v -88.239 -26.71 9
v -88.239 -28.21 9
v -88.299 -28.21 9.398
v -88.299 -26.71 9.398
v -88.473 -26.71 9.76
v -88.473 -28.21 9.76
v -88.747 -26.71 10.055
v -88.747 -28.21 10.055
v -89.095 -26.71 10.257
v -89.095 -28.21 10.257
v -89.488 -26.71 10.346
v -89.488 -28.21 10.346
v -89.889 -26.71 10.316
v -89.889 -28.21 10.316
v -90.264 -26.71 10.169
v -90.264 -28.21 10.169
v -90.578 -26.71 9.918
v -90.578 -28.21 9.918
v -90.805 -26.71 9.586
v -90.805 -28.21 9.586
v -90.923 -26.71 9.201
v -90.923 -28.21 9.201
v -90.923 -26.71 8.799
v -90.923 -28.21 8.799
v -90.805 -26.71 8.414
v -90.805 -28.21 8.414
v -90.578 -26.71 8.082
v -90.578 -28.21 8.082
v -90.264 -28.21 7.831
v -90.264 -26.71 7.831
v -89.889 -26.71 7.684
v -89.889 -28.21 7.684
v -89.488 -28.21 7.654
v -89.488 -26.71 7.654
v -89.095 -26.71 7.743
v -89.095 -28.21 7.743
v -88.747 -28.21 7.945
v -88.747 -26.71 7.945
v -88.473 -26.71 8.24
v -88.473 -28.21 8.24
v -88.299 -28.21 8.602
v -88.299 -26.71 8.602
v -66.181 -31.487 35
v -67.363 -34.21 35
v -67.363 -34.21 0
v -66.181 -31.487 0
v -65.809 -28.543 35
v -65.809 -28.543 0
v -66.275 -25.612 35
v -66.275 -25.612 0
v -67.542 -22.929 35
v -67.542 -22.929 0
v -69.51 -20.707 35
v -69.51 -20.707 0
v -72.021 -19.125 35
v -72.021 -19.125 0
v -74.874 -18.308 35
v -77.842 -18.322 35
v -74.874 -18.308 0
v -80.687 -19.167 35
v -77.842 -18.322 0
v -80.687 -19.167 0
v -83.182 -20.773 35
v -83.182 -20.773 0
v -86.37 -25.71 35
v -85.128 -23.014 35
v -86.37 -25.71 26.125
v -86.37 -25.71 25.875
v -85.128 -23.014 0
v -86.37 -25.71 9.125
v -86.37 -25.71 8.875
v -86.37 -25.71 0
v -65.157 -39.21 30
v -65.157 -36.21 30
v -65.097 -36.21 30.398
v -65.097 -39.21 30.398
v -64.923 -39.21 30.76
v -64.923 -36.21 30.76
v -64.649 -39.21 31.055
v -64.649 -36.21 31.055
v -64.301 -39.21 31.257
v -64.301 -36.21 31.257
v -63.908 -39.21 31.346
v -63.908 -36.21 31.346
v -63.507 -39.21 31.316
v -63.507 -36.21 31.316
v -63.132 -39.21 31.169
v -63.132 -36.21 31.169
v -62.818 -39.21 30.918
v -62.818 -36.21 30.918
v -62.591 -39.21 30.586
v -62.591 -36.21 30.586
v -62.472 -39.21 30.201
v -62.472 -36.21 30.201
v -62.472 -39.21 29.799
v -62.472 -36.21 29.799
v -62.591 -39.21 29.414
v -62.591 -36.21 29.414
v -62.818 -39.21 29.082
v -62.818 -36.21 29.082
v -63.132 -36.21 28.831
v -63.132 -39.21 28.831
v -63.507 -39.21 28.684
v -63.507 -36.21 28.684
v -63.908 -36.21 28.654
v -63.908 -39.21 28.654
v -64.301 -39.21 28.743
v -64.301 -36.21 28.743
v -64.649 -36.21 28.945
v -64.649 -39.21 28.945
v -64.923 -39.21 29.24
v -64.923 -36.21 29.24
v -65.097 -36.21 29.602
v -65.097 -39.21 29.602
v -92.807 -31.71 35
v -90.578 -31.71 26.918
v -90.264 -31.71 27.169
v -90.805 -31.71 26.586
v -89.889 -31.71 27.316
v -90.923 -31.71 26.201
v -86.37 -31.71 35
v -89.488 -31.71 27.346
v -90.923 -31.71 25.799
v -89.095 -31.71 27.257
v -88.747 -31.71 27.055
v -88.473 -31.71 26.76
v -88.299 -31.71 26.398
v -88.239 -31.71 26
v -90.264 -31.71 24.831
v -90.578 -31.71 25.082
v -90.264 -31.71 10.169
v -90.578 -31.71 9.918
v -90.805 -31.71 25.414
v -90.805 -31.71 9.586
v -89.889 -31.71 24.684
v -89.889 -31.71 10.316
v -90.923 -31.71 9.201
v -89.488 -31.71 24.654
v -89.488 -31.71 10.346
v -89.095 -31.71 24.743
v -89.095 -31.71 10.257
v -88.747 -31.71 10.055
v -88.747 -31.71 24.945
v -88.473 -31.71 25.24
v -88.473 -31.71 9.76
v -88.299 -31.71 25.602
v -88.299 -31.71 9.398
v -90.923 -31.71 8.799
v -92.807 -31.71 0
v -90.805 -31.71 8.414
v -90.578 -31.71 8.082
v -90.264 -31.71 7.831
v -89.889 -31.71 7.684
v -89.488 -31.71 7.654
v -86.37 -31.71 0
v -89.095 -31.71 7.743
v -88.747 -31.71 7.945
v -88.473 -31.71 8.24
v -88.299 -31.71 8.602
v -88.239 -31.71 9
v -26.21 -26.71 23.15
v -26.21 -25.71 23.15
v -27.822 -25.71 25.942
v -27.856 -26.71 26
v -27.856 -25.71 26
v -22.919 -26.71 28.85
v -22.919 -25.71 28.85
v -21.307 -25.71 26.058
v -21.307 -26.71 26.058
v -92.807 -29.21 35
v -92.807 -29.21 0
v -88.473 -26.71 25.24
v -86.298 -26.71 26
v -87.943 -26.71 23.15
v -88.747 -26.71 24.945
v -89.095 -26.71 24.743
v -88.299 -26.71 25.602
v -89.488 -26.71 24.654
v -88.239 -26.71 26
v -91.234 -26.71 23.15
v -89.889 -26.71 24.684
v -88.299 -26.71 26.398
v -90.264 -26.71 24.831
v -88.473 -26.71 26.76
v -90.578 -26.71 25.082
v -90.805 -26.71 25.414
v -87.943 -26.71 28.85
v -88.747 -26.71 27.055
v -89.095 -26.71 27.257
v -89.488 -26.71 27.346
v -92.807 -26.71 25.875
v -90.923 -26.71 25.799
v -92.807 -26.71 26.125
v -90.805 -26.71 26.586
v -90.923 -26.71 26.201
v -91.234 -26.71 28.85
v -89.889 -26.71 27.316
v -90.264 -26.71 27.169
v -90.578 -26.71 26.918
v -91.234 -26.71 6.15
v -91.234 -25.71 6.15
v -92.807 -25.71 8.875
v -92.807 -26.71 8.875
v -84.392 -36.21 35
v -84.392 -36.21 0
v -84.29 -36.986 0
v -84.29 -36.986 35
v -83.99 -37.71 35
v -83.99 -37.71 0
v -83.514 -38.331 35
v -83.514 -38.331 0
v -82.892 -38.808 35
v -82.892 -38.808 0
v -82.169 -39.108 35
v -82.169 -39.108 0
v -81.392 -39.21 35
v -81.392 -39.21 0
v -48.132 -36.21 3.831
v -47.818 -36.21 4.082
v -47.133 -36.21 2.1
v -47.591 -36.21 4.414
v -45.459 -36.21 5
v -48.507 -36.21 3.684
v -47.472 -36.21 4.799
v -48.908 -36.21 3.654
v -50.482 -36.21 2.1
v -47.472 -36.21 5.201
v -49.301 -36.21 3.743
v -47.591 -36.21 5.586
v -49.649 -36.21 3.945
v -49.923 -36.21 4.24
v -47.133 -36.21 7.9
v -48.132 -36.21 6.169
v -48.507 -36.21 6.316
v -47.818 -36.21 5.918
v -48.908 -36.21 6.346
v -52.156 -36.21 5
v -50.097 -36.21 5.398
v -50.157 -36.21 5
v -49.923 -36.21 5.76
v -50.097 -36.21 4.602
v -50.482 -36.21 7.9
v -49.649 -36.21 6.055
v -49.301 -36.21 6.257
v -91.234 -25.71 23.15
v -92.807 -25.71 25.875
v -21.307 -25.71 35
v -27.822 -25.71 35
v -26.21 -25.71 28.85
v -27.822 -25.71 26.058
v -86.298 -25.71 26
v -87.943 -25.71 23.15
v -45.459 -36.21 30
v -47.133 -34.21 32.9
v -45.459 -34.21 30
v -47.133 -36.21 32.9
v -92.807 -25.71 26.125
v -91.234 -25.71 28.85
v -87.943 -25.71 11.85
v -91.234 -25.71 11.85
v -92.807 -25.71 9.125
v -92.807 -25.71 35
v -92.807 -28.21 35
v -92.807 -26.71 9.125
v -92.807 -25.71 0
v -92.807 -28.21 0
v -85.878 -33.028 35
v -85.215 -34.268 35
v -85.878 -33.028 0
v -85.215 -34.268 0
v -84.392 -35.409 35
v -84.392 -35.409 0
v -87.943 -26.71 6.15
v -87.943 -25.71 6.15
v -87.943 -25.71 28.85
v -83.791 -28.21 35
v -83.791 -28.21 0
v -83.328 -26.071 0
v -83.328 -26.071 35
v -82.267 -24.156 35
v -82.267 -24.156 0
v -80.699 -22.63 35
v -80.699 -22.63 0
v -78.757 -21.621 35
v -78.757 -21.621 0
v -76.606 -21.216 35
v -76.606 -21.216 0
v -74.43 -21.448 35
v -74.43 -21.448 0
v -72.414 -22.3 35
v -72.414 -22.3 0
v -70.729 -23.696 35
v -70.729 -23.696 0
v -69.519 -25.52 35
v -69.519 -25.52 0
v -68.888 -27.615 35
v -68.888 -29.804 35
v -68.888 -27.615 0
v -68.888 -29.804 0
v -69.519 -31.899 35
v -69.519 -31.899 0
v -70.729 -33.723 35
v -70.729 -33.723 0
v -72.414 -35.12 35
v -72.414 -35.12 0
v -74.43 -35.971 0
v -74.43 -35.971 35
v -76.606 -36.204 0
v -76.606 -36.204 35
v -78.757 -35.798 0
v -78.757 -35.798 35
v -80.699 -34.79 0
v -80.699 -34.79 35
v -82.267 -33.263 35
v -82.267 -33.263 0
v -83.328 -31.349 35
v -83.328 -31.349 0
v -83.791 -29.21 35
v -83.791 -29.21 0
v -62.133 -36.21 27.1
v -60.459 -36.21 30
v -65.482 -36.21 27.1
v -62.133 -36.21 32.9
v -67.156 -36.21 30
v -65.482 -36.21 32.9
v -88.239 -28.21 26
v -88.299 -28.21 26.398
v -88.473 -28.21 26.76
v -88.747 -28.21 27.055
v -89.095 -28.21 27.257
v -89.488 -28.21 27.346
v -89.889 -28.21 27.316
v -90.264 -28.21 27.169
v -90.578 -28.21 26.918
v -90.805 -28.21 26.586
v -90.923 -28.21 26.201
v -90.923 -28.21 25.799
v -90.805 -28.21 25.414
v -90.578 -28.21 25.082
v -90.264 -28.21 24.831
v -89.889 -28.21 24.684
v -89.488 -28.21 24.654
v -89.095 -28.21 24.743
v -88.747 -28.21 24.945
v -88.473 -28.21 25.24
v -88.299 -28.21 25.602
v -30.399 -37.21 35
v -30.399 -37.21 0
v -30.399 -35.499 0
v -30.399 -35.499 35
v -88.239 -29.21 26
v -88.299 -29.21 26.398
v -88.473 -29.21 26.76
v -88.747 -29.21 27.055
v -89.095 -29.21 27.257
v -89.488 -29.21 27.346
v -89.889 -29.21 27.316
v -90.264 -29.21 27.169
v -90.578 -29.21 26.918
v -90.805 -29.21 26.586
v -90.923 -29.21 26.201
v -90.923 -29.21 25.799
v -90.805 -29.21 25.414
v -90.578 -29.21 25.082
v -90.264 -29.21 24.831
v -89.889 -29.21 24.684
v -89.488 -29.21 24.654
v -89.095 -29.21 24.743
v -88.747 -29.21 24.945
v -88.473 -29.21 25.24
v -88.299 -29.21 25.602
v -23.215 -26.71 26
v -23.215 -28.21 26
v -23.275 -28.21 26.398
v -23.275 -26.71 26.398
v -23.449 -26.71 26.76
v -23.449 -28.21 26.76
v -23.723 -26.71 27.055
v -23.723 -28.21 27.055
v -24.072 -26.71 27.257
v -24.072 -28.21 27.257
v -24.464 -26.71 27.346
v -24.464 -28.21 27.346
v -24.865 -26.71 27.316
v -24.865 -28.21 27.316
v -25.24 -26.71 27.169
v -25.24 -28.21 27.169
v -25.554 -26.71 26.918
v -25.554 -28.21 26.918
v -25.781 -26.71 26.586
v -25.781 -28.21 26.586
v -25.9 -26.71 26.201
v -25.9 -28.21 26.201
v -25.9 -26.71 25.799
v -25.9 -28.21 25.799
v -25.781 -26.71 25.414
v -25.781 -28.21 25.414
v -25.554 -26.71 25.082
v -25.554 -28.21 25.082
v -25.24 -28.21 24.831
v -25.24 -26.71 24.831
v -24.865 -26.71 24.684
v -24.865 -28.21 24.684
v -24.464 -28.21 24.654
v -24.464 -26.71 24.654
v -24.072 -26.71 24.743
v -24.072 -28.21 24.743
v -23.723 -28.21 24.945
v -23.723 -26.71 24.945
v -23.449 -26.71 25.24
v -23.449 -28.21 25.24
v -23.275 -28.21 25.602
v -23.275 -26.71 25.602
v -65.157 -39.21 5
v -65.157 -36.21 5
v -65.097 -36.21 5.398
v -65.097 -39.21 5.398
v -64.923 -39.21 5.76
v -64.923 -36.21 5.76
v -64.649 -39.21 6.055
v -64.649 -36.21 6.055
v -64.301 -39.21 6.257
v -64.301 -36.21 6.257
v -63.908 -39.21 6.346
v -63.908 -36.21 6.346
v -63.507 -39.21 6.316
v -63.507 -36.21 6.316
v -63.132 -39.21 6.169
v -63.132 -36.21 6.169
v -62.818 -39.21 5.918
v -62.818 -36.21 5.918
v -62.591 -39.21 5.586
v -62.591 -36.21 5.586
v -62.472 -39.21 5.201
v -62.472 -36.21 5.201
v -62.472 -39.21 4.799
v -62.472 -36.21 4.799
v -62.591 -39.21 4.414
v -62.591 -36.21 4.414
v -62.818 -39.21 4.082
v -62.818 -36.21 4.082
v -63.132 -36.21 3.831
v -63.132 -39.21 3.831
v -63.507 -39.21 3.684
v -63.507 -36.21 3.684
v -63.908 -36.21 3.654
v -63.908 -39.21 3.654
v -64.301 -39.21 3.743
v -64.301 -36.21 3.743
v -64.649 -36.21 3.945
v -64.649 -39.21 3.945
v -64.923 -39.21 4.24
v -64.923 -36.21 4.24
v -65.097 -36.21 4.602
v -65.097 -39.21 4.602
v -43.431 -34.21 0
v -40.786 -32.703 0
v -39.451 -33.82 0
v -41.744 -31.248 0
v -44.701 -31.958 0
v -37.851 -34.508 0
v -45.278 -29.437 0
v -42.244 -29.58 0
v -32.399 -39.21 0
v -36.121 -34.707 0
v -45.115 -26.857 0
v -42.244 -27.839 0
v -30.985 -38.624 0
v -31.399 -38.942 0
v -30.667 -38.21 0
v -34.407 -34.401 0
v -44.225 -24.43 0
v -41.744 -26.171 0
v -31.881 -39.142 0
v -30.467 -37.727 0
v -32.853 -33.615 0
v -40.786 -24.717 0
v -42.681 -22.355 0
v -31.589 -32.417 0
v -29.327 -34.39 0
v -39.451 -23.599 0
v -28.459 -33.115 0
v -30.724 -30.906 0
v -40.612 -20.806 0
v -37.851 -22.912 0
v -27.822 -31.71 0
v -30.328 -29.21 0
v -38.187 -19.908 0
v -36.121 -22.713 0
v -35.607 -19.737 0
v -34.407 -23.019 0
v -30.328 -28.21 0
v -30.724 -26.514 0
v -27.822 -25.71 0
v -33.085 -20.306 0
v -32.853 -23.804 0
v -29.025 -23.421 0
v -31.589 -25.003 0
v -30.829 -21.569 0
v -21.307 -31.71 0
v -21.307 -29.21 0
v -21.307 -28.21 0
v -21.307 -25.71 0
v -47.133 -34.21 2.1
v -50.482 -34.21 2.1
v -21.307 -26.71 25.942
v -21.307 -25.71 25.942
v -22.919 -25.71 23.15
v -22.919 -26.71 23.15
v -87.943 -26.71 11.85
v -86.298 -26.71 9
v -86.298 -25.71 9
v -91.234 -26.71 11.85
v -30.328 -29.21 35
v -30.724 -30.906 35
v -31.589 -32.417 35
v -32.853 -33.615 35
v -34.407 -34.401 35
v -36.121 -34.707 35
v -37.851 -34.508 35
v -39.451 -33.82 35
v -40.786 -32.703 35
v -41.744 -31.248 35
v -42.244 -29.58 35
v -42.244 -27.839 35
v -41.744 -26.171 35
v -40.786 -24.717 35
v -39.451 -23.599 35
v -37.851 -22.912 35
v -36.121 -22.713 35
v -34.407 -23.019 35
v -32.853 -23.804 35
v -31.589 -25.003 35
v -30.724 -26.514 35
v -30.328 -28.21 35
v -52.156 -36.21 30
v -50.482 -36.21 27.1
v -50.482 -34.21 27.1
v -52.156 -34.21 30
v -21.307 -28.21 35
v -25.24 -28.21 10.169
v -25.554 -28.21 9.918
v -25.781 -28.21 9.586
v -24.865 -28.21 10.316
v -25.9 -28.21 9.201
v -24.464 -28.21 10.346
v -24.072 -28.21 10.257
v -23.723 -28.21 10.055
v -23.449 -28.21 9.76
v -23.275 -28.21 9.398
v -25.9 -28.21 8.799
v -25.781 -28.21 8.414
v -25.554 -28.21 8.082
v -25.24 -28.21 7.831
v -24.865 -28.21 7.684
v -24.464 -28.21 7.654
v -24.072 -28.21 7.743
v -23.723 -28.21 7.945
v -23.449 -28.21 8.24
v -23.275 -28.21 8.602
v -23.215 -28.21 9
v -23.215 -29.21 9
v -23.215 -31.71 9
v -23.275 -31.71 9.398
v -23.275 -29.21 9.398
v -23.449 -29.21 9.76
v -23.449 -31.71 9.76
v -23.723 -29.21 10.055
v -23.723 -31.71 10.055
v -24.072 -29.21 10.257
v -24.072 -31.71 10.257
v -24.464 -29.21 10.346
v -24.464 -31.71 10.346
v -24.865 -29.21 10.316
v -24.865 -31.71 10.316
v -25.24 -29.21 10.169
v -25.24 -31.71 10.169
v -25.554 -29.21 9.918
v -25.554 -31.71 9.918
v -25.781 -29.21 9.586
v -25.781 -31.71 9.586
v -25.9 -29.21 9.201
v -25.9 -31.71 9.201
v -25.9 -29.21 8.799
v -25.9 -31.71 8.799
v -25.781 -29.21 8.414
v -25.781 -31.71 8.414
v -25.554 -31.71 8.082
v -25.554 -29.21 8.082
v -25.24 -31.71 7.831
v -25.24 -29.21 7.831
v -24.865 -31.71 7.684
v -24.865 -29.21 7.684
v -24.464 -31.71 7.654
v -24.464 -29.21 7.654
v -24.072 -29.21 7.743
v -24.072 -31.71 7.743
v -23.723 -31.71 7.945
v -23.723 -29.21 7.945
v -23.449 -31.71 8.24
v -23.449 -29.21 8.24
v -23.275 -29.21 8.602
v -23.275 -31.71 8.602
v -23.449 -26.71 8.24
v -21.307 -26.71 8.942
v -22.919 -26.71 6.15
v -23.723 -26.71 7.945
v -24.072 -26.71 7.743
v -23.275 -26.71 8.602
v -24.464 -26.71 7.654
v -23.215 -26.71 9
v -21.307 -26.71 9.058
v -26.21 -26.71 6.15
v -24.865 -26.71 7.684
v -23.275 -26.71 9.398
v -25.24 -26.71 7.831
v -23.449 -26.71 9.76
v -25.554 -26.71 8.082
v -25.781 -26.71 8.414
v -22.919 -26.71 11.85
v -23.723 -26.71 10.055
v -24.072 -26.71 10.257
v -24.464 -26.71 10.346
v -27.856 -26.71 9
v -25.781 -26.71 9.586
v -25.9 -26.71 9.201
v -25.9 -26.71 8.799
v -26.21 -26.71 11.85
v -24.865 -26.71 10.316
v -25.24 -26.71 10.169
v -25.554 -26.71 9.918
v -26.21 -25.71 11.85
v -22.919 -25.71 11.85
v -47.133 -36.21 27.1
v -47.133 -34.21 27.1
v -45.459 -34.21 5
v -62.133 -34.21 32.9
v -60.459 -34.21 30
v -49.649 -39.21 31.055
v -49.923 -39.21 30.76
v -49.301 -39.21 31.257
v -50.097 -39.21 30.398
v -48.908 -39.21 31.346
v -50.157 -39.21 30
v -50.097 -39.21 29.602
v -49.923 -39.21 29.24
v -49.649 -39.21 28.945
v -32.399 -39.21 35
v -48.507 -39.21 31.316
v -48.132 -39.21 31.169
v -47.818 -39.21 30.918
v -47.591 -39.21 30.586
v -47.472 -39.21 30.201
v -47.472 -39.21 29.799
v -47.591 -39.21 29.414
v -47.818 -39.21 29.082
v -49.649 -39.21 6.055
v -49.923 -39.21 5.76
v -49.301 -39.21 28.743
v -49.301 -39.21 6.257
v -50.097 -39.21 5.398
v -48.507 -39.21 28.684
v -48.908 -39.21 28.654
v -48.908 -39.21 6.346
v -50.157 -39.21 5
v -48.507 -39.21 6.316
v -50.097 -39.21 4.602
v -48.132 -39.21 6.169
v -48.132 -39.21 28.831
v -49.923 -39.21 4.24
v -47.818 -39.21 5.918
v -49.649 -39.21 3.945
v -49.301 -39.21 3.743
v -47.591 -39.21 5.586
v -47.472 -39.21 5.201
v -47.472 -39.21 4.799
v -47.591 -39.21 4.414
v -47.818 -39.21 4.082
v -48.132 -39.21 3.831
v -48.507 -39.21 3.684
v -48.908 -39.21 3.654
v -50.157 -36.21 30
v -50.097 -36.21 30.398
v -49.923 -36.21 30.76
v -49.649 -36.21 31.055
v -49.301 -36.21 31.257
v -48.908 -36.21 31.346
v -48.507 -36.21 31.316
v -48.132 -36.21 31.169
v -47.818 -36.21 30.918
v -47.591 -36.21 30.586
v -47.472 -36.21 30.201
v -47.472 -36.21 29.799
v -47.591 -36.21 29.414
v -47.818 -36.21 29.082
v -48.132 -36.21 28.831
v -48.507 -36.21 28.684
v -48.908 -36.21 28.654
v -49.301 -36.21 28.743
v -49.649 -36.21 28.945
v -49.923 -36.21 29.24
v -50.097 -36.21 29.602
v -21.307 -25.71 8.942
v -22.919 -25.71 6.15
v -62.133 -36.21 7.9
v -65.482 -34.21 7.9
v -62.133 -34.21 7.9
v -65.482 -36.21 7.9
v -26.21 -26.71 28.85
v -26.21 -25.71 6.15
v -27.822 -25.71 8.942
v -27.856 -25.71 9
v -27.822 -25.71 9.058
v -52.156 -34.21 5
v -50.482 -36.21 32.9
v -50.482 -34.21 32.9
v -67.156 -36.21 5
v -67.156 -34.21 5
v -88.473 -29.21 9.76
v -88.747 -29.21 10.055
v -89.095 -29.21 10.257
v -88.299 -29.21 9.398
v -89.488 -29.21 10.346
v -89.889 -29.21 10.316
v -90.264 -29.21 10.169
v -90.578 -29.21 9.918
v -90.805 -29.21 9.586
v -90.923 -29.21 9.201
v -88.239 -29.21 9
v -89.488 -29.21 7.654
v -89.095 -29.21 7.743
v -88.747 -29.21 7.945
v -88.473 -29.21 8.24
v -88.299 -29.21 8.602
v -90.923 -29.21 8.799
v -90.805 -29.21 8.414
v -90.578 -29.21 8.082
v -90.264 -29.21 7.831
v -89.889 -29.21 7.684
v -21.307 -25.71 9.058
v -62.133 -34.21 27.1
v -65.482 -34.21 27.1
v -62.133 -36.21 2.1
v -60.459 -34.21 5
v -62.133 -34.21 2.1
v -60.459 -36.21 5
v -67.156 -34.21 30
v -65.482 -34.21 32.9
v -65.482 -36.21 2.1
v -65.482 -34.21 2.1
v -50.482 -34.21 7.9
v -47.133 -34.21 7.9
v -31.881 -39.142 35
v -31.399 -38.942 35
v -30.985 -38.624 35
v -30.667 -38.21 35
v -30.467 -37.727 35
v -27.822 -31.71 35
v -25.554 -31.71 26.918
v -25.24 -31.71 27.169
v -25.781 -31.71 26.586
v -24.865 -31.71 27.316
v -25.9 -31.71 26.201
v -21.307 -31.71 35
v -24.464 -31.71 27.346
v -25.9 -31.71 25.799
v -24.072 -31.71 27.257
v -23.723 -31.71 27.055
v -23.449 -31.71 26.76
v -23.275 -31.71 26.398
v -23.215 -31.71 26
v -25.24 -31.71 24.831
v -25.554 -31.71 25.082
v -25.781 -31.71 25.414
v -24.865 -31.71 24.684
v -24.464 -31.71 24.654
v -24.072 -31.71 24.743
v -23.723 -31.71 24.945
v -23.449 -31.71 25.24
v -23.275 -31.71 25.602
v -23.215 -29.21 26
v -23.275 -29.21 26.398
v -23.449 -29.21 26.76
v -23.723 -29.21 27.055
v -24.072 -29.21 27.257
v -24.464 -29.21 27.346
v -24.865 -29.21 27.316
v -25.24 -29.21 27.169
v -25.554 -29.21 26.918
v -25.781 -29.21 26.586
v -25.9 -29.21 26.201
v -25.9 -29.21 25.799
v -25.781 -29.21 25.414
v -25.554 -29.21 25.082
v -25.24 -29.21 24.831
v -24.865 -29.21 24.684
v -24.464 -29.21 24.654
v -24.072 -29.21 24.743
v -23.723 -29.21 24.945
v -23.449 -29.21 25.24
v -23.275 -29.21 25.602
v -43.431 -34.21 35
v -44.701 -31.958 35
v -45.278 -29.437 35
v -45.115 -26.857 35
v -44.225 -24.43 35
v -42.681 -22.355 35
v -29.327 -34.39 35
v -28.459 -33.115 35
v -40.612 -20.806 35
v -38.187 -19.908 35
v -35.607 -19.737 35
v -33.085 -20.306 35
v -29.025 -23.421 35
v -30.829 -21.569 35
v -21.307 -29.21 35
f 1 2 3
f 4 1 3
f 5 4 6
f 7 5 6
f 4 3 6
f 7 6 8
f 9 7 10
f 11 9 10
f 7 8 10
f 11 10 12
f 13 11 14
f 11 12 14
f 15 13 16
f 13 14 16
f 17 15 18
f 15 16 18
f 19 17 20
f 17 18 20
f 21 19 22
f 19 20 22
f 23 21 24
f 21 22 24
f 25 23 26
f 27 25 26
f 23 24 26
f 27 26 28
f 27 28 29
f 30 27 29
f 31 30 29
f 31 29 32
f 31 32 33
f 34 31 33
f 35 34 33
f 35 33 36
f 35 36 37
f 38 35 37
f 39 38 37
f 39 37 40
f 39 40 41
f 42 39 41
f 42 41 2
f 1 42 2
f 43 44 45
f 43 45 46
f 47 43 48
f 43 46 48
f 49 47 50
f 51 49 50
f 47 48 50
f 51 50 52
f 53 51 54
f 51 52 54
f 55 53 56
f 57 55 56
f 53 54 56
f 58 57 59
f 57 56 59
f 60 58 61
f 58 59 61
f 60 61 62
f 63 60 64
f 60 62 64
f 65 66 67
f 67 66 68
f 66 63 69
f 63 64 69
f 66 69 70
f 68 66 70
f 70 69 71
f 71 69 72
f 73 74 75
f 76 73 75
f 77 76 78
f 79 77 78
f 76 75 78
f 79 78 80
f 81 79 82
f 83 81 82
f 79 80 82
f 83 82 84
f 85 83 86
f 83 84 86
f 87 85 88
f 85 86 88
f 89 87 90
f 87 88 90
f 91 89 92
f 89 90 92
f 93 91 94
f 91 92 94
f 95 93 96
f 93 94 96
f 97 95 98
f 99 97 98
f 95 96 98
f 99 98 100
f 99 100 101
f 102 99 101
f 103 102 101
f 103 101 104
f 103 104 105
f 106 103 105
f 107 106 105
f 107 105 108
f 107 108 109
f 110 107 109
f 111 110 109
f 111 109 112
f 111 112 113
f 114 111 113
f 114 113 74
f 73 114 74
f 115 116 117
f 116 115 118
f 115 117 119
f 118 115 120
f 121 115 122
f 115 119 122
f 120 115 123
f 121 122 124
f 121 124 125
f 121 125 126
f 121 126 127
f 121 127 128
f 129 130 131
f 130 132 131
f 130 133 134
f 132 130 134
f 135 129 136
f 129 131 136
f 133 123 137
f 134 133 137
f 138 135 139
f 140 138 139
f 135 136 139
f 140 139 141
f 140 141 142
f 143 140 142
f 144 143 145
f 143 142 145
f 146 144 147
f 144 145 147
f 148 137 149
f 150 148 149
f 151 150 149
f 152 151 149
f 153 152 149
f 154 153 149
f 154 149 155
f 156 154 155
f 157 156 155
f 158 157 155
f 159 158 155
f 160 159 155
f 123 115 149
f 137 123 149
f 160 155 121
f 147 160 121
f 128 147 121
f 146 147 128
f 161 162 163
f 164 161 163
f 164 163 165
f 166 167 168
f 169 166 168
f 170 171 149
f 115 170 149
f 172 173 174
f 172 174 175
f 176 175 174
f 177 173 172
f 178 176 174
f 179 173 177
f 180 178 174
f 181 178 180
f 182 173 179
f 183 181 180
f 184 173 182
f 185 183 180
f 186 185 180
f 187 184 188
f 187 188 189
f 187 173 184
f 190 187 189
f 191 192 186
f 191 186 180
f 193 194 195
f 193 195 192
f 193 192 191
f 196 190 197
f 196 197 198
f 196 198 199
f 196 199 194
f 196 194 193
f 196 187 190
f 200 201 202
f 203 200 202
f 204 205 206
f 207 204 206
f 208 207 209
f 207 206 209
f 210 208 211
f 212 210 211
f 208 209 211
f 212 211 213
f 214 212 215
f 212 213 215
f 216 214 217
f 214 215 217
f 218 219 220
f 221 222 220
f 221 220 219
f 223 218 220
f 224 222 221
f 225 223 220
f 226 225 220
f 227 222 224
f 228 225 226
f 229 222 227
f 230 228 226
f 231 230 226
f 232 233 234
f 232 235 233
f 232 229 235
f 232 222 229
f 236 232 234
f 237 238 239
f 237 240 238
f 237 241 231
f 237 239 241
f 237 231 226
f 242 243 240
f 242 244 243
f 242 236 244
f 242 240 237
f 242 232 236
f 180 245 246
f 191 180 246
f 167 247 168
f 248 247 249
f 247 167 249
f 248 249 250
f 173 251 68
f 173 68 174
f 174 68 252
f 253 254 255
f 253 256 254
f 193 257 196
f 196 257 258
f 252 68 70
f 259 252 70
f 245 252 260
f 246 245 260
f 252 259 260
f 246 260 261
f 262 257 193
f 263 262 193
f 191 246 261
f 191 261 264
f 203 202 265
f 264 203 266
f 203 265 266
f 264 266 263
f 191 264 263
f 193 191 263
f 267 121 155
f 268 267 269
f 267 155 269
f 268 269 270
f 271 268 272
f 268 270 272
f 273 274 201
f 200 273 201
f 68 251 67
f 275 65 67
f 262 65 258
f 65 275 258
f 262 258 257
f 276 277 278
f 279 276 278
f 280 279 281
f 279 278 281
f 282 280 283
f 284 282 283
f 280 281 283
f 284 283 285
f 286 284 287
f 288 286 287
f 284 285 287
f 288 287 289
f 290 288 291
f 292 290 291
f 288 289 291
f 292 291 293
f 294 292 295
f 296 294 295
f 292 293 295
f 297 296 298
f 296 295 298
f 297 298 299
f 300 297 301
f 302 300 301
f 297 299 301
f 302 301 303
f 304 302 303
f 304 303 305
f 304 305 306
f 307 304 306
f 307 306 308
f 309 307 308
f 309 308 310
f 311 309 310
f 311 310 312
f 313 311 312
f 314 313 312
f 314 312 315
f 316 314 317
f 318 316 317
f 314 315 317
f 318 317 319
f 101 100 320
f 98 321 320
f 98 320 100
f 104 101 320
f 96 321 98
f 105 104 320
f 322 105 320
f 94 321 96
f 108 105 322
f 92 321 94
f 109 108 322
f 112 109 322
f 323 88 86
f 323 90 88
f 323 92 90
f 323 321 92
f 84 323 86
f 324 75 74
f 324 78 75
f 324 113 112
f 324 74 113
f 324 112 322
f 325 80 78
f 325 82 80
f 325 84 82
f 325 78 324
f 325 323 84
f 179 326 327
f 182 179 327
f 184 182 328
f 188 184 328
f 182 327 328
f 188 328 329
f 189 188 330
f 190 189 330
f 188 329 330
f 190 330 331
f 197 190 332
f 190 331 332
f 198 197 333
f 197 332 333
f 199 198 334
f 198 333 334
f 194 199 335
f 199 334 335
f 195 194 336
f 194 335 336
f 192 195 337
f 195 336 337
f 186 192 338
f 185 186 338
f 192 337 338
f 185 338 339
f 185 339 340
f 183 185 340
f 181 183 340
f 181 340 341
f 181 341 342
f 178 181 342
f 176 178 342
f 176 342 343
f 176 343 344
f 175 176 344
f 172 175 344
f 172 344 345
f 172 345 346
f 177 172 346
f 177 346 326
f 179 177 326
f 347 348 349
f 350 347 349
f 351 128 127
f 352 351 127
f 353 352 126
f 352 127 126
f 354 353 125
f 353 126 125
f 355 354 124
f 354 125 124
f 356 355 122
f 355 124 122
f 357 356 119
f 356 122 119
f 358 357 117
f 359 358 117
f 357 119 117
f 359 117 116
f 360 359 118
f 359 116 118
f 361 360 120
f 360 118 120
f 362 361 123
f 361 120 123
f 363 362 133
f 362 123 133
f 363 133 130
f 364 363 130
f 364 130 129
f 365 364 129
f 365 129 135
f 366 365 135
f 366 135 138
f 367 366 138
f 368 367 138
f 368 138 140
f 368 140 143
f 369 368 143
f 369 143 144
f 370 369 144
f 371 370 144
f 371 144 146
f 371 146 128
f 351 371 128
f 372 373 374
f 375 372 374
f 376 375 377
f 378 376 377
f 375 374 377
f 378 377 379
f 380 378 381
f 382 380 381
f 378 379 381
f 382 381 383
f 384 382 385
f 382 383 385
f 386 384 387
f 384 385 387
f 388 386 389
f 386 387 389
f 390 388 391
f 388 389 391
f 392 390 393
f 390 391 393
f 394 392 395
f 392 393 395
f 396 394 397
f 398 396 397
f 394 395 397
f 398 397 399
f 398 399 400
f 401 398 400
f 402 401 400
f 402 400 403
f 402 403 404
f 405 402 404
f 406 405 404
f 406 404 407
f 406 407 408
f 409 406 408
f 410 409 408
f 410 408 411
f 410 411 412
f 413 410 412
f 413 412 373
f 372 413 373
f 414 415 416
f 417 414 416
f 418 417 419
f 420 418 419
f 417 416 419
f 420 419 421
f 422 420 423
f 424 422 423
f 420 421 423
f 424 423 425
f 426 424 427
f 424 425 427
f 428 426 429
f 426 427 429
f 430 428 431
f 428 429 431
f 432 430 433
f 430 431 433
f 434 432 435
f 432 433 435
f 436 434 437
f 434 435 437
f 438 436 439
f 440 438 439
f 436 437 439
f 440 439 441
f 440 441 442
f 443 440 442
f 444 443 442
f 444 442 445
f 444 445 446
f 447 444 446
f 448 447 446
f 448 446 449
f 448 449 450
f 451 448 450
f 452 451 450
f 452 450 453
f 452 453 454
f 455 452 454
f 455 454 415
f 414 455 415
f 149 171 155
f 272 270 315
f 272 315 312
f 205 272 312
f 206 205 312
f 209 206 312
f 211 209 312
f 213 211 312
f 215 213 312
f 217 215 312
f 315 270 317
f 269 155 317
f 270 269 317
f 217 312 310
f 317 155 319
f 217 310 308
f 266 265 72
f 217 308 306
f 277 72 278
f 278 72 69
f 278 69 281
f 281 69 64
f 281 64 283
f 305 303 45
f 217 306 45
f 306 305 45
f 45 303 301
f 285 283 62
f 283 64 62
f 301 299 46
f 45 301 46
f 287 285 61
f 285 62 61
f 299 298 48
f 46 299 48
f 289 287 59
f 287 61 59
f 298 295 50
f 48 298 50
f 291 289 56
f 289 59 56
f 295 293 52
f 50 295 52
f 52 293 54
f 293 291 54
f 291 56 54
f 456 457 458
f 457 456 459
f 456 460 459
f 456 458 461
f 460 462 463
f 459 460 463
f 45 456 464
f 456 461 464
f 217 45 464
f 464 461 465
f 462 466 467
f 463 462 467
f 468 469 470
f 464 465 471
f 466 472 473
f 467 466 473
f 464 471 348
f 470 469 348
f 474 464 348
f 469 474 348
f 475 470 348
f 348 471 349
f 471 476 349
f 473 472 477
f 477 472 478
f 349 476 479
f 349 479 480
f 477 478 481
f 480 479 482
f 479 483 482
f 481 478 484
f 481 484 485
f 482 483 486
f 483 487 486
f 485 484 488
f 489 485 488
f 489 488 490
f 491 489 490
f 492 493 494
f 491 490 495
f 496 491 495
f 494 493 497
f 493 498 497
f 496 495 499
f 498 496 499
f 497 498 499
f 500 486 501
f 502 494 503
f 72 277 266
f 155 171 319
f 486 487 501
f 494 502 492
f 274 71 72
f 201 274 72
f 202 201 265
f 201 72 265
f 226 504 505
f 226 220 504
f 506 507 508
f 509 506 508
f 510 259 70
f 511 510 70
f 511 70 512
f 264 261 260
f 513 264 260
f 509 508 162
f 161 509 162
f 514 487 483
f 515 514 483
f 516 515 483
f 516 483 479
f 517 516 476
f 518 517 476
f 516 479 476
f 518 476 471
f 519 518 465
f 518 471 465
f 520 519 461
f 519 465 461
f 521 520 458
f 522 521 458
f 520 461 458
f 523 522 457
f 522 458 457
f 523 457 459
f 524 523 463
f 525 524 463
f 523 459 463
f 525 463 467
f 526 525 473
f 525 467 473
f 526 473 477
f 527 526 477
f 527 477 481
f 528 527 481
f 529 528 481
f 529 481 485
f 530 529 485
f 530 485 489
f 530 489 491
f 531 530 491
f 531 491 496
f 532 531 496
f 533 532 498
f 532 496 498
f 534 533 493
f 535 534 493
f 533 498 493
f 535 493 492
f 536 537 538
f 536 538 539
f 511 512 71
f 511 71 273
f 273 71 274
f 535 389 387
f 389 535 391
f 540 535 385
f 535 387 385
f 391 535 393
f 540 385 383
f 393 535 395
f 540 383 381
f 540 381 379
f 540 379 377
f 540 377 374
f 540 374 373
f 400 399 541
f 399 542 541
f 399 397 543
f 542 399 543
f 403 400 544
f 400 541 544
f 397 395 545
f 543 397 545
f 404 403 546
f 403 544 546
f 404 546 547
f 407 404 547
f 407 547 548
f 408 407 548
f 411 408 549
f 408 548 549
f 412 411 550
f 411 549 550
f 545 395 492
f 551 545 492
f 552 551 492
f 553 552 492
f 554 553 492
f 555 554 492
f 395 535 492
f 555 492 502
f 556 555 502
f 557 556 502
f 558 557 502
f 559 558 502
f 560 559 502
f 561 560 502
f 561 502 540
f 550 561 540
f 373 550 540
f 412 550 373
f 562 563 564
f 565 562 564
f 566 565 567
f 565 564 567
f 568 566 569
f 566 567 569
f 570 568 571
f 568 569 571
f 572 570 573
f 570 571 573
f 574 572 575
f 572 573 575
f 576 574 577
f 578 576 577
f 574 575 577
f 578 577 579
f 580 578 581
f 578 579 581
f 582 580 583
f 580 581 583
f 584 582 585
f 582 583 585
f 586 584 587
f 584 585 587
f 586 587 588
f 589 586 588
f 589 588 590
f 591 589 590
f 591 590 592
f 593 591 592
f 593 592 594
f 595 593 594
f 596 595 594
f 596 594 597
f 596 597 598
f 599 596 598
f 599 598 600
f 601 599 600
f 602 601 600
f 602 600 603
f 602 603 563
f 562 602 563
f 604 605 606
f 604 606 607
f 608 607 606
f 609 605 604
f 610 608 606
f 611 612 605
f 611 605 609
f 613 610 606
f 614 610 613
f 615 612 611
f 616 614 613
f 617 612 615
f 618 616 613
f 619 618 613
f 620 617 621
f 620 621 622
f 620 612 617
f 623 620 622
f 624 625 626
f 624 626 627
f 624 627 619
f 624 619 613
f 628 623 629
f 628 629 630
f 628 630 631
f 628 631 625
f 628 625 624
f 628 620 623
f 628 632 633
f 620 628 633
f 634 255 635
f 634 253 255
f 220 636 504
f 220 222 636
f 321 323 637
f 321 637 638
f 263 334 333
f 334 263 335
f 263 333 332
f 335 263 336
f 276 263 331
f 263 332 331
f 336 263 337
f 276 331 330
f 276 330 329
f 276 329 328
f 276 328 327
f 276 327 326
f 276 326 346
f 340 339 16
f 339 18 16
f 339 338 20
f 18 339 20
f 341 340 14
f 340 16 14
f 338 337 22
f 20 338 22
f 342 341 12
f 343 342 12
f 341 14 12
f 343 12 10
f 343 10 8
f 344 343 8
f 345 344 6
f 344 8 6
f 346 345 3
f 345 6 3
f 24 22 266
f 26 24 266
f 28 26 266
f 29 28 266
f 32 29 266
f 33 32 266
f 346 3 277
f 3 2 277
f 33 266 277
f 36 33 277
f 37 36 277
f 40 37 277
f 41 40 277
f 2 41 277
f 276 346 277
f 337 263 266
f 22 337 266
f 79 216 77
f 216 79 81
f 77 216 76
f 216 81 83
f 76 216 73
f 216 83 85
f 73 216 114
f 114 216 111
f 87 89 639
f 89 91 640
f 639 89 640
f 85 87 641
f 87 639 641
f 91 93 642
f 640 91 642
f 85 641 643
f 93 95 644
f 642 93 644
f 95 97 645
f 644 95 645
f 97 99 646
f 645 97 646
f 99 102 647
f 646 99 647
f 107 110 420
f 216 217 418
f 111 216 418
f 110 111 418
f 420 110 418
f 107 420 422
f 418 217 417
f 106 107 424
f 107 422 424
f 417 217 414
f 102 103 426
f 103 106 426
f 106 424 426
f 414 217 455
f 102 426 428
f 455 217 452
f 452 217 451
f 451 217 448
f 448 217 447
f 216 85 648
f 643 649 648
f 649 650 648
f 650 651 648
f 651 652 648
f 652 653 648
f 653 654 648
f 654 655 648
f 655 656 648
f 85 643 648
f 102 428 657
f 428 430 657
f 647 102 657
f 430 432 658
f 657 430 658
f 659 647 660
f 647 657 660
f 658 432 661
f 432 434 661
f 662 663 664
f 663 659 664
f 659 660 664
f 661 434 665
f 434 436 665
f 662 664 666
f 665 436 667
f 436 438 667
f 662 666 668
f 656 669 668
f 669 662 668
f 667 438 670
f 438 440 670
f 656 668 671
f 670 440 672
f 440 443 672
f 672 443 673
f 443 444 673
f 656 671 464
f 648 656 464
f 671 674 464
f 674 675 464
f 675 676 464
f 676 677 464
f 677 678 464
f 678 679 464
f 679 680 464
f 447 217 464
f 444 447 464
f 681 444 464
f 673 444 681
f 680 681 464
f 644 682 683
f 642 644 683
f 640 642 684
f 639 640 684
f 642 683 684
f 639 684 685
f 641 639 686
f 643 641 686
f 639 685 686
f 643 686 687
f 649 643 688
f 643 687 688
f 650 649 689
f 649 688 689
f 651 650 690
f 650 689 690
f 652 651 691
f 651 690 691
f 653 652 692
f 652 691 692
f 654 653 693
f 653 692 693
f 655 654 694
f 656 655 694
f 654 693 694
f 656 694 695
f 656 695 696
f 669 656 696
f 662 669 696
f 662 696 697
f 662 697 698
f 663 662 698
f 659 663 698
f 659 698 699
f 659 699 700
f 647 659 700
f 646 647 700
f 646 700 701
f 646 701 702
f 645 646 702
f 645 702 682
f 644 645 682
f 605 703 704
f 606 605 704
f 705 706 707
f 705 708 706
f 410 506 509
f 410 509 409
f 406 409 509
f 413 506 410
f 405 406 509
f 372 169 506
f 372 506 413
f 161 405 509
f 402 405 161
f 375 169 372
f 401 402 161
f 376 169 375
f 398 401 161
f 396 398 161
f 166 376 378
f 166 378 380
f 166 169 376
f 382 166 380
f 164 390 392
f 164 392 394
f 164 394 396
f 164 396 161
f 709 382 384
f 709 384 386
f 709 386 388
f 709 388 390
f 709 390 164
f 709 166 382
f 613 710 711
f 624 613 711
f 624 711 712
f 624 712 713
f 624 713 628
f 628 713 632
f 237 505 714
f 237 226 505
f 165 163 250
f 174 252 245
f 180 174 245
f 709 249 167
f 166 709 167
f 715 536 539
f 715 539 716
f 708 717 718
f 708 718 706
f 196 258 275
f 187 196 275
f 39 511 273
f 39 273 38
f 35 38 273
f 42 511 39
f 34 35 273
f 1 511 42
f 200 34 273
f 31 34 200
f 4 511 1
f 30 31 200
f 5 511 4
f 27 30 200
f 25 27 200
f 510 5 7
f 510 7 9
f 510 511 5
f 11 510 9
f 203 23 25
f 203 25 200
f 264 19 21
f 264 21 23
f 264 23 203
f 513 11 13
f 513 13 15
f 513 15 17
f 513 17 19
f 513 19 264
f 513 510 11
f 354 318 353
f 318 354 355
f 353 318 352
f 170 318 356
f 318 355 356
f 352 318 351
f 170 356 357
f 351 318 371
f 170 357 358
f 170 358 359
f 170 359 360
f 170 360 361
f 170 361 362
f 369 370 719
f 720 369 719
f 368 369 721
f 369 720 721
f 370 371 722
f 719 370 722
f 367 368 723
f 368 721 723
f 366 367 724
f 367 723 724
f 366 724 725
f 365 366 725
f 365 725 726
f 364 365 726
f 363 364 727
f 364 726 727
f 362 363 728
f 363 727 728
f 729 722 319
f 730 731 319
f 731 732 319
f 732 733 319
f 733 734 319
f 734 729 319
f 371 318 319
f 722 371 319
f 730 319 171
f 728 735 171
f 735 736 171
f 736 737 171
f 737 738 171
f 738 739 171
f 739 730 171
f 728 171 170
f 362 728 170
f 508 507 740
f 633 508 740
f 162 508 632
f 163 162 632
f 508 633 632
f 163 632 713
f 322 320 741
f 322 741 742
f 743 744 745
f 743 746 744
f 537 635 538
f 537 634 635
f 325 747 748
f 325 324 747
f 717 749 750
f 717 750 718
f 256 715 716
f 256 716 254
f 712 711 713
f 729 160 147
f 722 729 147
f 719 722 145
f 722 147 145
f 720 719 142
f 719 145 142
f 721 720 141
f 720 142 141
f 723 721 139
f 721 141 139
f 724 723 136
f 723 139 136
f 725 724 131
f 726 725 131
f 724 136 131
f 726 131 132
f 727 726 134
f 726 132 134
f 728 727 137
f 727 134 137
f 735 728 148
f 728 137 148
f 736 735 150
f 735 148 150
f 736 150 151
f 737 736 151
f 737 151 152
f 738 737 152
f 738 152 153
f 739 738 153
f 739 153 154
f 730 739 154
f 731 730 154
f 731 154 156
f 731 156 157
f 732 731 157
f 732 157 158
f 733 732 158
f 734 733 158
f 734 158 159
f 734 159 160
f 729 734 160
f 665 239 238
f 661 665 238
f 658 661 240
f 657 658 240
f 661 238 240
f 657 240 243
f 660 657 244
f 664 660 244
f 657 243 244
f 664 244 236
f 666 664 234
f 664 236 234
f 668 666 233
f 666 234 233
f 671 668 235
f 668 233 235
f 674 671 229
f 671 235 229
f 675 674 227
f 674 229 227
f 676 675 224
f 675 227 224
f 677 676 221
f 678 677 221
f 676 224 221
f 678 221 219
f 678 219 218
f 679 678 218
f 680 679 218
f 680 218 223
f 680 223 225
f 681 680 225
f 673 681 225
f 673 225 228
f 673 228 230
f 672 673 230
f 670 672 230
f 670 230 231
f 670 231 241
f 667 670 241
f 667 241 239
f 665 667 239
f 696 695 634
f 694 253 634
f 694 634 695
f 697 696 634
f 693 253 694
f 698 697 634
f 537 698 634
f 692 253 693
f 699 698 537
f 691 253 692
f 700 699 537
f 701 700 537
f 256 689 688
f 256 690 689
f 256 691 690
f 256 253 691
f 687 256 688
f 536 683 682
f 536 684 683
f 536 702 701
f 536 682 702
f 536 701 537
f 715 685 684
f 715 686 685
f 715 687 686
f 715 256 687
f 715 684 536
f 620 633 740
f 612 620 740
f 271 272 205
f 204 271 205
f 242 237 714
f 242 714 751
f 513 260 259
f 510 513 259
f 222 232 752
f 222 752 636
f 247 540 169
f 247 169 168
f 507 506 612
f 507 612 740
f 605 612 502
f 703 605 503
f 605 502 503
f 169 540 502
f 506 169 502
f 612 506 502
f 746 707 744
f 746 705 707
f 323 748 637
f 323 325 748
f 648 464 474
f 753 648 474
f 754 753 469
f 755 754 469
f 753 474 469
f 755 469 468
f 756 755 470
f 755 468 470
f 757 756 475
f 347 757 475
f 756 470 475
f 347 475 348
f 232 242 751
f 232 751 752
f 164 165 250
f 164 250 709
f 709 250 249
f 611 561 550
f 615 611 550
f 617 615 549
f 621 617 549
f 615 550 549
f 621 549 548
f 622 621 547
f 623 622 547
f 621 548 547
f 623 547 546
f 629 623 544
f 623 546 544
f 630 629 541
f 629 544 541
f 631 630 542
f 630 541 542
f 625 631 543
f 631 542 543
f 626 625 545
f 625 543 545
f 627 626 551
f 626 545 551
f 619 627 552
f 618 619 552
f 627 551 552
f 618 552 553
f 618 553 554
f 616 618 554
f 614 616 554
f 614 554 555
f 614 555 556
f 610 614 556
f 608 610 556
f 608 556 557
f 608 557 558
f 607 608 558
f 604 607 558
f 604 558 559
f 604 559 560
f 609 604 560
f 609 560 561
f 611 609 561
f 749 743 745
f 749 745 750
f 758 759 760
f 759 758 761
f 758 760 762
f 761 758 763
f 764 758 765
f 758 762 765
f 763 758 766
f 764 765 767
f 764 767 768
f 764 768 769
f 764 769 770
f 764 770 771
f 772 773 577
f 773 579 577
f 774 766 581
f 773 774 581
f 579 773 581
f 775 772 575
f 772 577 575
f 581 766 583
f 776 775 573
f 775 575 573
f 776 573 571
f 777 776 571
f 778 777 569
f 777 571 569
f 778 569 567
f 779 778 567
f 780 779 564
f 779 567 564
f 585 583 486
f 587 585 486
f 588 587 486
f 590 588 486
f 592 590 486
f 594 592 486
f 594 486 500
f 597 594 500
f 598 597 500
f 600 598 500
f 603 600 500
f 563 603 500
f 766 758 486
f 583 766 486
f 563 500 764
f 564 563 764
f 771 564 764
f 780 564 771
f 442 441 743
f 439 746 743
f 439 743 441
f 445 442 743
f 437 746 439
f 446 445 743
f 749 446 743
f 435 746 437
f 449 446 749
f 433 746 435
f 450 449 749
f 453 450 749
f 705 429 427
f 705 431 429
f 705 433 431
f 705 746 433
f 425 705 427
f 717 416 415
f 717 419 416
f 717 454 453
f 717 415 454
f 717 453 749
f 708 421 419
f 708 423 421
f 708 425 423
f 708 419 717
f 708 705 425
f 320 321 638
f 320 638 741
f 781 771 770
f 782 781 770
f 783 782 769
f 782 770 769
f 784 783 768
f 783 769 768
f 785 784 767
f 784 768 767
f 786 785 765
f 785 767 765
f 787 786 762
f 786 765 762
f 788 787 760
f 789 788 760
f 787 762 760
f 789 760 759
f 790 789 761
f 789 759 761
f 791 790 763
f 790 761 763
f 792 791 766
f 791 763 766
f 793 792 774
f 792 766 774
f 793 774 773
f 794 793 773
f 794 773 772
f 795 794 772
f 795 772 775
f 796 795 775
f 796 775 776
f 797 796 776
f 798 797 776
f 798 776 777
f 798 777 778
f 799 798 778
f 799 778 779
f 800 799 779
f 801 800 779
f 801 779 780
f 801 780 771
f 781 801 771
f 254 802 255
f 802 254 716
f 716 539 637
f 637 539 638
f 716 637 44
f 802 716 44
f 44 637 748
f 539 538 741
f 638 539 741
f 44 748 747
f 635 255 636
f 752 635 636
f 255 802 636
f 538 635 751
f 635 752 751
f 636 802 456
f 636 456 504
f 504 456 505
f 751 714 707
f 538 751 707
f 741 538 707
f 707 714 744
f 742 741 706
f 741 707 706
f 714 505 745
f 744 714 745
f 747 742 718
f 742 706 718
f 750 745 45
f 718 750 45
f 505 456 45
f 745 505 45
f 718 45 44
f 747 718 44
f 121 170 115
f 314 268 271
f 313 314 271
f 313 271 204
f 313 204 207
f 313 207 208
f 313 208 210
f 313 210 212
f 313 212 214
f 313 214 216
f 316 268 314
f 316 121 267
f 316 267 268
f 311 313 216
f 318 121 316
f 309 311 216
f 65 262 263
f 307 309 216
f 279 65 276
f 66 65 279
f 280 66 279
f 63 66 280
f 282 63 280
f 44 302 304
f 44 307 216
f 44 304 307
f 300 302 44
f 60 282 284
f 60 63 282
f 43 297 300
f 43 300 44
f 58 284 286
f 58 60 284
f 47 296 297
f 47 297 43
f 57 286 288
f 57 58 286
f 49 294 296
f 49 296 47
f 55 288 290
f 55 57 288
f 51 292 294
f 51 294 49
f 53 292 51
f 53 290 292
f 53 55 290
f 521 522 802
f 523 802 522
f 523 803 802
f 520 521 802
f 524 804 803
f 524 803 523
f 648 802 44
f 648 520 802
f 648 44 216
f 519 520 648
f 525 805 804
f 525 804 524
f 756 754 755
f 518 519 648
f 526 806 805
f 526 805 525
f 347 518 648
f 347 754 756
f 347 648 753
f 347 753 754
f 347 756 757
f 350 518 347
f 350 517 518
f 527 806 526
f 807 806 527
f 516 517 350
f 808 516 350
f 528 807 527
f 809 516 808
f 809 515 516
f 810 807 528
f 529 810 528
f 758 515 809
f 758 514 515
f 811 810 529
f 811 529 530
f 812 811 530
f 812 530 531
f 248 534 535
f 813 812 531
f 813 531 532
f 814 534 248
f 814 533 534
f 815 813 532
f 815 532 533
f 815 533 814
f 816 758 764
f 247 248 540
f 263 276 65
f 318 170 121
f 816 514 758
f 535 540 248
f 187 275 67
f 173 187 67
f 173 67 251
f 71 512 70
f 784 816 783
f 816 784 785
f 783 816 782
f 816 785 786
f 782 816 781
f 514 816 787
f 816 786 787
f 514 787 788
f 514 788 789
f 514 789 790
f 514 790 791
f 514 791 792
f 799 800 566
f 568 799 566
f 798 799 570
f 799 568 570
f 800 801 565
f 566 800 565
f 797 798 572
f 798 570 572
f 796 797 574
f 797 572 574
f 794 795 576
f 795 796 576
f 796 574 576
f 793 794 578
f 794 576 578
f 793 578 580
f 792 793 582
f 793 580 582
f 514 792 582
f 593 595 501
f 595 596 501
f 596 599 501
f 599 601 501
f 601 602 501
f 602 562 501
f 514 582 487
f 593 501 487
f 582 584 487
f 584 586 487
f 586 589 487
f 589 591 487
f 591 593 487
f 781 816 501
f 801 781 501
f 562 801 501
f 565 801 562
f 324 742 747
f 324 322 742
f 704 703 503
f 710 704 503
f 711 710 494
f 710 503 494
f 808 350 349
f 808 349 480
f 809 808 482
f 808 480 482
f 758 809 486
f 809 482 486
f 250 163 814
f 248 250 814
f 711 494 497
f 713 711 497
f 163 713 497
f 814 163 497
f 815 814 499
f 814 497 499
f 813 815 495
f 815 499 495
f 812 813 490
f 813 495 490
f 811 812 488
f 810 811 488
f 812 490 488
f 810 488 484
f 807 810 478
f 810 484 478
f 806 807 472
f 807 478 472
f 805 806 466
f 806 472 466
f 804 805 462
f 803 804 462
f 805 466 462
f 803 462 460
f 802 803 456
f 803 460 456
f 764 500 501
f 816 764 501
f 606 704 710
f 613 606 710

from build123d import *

# Parameters (mm, degrees)
F1_DEPTH   = 35
F3_D       = 2.7
F5_DEPTH   = 1
F6_DEPTH   = 1
F9_D       = 2.7
F9_ON_F7_D = 2.7
F8_W       = 1.6217698948
F8_H       = 2.85
F10_DEPTH  = 1
F11_DEPTH  = 1


# Not quite as in the source:
# - a feature names something its author has since deleted; it is built from what else it names


with BuildPart() as f1:
    # F0 (on Top) → F1 (new body)
    with BuildSketch(Plane.XY):
        with BuildLine():
            Line((-21.3074208284, -25.7097307226), (-27.8221394541, -25.7097307226))
            ThreePointArc((-27.8221394541, -25.7097307226), (-41.1900200037, -21.1492925546), (-42.5323706273, -35.2097307226))
            Line((-42.5323706273, -35.2097307226), (-68.0612095771, -35.2097307226))
            ThreePointArc((-68.0612095771, -35.2097307226), (-71.4714049121, -19.3897012131), (-86.3697267271, -25.7097307226))
            Line((-86.3697267271, -25.7097307226), (-92.8074208284, -25.7097307226))
            Line((-92.8074208284, -25.7097307226), (-92.8074208284, -28.2097307226))
            Line((-92.8074208284, -28.2097307226), (-83.7907356019, -28.2097307226))
            ThreePointArc((-83.7907356019, -28.2097307226), (-68.8074208284, -28.7097307226), (-83.7907356019, -29.2097307226))
            Line((-83.7907356019, -29.2097307226), (-92.8074208284, -29.2097307226))
            Line((-92.8074208284, -29.2097307226), (-92.8074208284, -31.7097307226))
            Line((-92.8074208284, -31.7097307226), (-86.3697267271, -31.7097307226))
            ThreePointArc((-86.3697267271, -31.7097307226), (-85.5676654464, -33.6592629847), (-84.3923404334, -35.4092885424))
            Line((-84.3923404334, -35.4092885424), (-84.3923404334, -36.2097307226))
            ThreePointArc((-84.3923404334, -36.2097307226), (-83.5136607769, -38.3310510662), (-81.3923404334, -39.2097307226))
            Line((-81.3923404334, -39.2097307226), (-32.3990289542, -39.2097307226))
            ThreePointArc((-32.3990289542, -39.2097307226), (-30.9848153918, -38.623944285), (-30.3990289542, -37.2097307226))
            Line((-30.3990289542, -37.2097307226), (-30.3990289542, -35.4987590376))
            ThreePointArc((-30.3990289542, -35.4987590376), (-28.8654021984, -33.7709913079), (-27.8221394541, -31.7097307226))
            Line((-27.8221394541, -31.7097307226), (-21.3074208284, -31.7097307226))
            Line((-21.3074208284, -31.7097307226), (-21.3074208284, -29.2097307226))
            Line((-21.3074208284, -29.2097307226), (-30.3282904568, -29.2097307226))
            ThreePointArc((-30.3282904568, -29.2097307226), (-42.3074208284, -28.7097307226), (-30.3282904568, -28.2097307226))
            Line((-30.3282904568, -28.2097307226), (-21.3074208284, -28.2097307226))
            Line((-21.3074208284, -28.2097307226), (-21.3074208284, -25.7097307226))
        make_face()
    extrude(amount=F1_DEPTH)

    # F3 (through all)
    with Locations(Plane.XZ.offset(39.2097307226)):
        with Locations((-63.8074208284, 30), (-48.80741708, 30), (-48.80741708, 5), (-63.8074208284, 5)):
            Hole(F3_D / 2)

    # F4 (on face) → F5 (cut)
    with BuildSketch(Plane(origin=(0, -35.2097307226, 0), x_dir=(-1, 0, 0), z_dir=(0, 1, 0))):
        Polygon((50.4817328606, 27.1), (52.1560486413, 30), (50.4817328606, 32.9), (47.1331012993, 32.9), (45.4587855187, 30), (47.1331012993, 27.1), align=None)
        Polygon((62.1331050477, 32.9), (60.4587892671, 30), (62.1331050477, 27.1), (65.481736609, 27.1), (67.1560523897, 30), (65.481736609, 32.9), align=None)
        Polygon((52.1560486413, 5), (50.4817328606, 7.9), (47.1331012993, 7.9), (45.4587855187, 5), (47.1331012993, 2.1), (50.4817328606, 2.1), align=None)
        Polygon((62.1331050477, 2.1), (65.481736609, 2.1), (67.1560523897, 5), (65.481736609, 7.9), (62.1331050477, 7.9), (60.4587892671, 5), align=None)
    extrude(amount=-F5_DEPTH, mode=Mode.SUBTRACT)

    # F6 (add): a face of the model
    f6_faces = [f1.faces().sort_by_distance(p)[0] for p in [
        (-55.1452142049, -35.2097307226, 17.5),
    ]]
    extrude(f6_faces, amount=F6_DEPTH)

    # F9 (through all)
    with Locations(Plane(origin=(0, -25.7097307226, 0), x_dir=(-1, 0, 0), z_dir=(0, 1, 0))):
        with Locations((24.5647801412, 26), (24.5647801412, 9)):
            Hole(F9_D / 2)

    # F9 on F7 (through all)
    with Locations(Plane(origin=(0, -25.7097307226, 0), x_dir=(-1, 0, 0), z_dir=(0, 1, 0))):
        with Locations((89.5885737777, 9), (89.5885737777, 26)):
            Hole(F9_ON_F7_D / 2)

    # F8 (on face) → F10 (cut)
    with BuildSketch(Plane(origin=(0, -25.7097307226, 0), x_dir=(-1, 0, 0), z_dir=(0, 1, 0))):
        Polygon((26.2102284084, 28.85), (24.5647801412, 28.85), (24.5647801412, 26), (26.1865500361, 26), (26.1865500361, 23.15), (26.2102284084, 23.15), (27.8556766756, 26), align=None)
        Polygon((24.5647801412, 26), (24.5647801412, 28.85), (22.919331874, 28.85), (21.2738836069, 26), (22.919331874, 23.15), (24.5647801412, 23.15), align=None)
        with Locations((25.3756650887, 10.425)):
            Rectangle(F8_W, F8_H)
        Polygon((24.5647801412, 9), (24.5647801412, 11.85), (22.919331874, 11.85), (21.2738836069, 9), (22.919331874, 6.15), (24.5647801412, 6.15), align=None)
        with Locations((25.3756650887, 24.575)):
            Rectangle(F8_W, F8_H)
        Polygon((26.1865500361, 9), (24.5647801412, 9), (24.5647801412, 6.15), (26.2102284084, 6.15), (27.8556766756, 9), (26.2102284084, 11.85), (26.1865500361, 11.85), align=None)
    extrude(amount=-F10_DEPTH, mode=Mode.SUBTRACT)

    # F7 (on face) → F11 (cut)
    with BuildSketch(Plane(origin=(0, -25.7097307226, 0), x_dir=(-1, 0, 0), z_dir=(0, 1, 0))):
        Polygon((91.2340220449, 6.15), (92.8794703121, 9), (91.2340220449, 11.85), (87.9431255105, 11.85), (86.2976772433, 9), (87.9431255105, 6.15), align=None)
        Polygon((92.8794703121, 26), (91.2340220449, 28.85), (87.9431255105, 28.85), (86.2976772433, 26), (87.9431255105, 23.15), (91.2340220449, 23.15), align=None)
    extrude(amount=-F11_DEPTH, mode=Mode.SUBTRACT)


solid = f1.part
